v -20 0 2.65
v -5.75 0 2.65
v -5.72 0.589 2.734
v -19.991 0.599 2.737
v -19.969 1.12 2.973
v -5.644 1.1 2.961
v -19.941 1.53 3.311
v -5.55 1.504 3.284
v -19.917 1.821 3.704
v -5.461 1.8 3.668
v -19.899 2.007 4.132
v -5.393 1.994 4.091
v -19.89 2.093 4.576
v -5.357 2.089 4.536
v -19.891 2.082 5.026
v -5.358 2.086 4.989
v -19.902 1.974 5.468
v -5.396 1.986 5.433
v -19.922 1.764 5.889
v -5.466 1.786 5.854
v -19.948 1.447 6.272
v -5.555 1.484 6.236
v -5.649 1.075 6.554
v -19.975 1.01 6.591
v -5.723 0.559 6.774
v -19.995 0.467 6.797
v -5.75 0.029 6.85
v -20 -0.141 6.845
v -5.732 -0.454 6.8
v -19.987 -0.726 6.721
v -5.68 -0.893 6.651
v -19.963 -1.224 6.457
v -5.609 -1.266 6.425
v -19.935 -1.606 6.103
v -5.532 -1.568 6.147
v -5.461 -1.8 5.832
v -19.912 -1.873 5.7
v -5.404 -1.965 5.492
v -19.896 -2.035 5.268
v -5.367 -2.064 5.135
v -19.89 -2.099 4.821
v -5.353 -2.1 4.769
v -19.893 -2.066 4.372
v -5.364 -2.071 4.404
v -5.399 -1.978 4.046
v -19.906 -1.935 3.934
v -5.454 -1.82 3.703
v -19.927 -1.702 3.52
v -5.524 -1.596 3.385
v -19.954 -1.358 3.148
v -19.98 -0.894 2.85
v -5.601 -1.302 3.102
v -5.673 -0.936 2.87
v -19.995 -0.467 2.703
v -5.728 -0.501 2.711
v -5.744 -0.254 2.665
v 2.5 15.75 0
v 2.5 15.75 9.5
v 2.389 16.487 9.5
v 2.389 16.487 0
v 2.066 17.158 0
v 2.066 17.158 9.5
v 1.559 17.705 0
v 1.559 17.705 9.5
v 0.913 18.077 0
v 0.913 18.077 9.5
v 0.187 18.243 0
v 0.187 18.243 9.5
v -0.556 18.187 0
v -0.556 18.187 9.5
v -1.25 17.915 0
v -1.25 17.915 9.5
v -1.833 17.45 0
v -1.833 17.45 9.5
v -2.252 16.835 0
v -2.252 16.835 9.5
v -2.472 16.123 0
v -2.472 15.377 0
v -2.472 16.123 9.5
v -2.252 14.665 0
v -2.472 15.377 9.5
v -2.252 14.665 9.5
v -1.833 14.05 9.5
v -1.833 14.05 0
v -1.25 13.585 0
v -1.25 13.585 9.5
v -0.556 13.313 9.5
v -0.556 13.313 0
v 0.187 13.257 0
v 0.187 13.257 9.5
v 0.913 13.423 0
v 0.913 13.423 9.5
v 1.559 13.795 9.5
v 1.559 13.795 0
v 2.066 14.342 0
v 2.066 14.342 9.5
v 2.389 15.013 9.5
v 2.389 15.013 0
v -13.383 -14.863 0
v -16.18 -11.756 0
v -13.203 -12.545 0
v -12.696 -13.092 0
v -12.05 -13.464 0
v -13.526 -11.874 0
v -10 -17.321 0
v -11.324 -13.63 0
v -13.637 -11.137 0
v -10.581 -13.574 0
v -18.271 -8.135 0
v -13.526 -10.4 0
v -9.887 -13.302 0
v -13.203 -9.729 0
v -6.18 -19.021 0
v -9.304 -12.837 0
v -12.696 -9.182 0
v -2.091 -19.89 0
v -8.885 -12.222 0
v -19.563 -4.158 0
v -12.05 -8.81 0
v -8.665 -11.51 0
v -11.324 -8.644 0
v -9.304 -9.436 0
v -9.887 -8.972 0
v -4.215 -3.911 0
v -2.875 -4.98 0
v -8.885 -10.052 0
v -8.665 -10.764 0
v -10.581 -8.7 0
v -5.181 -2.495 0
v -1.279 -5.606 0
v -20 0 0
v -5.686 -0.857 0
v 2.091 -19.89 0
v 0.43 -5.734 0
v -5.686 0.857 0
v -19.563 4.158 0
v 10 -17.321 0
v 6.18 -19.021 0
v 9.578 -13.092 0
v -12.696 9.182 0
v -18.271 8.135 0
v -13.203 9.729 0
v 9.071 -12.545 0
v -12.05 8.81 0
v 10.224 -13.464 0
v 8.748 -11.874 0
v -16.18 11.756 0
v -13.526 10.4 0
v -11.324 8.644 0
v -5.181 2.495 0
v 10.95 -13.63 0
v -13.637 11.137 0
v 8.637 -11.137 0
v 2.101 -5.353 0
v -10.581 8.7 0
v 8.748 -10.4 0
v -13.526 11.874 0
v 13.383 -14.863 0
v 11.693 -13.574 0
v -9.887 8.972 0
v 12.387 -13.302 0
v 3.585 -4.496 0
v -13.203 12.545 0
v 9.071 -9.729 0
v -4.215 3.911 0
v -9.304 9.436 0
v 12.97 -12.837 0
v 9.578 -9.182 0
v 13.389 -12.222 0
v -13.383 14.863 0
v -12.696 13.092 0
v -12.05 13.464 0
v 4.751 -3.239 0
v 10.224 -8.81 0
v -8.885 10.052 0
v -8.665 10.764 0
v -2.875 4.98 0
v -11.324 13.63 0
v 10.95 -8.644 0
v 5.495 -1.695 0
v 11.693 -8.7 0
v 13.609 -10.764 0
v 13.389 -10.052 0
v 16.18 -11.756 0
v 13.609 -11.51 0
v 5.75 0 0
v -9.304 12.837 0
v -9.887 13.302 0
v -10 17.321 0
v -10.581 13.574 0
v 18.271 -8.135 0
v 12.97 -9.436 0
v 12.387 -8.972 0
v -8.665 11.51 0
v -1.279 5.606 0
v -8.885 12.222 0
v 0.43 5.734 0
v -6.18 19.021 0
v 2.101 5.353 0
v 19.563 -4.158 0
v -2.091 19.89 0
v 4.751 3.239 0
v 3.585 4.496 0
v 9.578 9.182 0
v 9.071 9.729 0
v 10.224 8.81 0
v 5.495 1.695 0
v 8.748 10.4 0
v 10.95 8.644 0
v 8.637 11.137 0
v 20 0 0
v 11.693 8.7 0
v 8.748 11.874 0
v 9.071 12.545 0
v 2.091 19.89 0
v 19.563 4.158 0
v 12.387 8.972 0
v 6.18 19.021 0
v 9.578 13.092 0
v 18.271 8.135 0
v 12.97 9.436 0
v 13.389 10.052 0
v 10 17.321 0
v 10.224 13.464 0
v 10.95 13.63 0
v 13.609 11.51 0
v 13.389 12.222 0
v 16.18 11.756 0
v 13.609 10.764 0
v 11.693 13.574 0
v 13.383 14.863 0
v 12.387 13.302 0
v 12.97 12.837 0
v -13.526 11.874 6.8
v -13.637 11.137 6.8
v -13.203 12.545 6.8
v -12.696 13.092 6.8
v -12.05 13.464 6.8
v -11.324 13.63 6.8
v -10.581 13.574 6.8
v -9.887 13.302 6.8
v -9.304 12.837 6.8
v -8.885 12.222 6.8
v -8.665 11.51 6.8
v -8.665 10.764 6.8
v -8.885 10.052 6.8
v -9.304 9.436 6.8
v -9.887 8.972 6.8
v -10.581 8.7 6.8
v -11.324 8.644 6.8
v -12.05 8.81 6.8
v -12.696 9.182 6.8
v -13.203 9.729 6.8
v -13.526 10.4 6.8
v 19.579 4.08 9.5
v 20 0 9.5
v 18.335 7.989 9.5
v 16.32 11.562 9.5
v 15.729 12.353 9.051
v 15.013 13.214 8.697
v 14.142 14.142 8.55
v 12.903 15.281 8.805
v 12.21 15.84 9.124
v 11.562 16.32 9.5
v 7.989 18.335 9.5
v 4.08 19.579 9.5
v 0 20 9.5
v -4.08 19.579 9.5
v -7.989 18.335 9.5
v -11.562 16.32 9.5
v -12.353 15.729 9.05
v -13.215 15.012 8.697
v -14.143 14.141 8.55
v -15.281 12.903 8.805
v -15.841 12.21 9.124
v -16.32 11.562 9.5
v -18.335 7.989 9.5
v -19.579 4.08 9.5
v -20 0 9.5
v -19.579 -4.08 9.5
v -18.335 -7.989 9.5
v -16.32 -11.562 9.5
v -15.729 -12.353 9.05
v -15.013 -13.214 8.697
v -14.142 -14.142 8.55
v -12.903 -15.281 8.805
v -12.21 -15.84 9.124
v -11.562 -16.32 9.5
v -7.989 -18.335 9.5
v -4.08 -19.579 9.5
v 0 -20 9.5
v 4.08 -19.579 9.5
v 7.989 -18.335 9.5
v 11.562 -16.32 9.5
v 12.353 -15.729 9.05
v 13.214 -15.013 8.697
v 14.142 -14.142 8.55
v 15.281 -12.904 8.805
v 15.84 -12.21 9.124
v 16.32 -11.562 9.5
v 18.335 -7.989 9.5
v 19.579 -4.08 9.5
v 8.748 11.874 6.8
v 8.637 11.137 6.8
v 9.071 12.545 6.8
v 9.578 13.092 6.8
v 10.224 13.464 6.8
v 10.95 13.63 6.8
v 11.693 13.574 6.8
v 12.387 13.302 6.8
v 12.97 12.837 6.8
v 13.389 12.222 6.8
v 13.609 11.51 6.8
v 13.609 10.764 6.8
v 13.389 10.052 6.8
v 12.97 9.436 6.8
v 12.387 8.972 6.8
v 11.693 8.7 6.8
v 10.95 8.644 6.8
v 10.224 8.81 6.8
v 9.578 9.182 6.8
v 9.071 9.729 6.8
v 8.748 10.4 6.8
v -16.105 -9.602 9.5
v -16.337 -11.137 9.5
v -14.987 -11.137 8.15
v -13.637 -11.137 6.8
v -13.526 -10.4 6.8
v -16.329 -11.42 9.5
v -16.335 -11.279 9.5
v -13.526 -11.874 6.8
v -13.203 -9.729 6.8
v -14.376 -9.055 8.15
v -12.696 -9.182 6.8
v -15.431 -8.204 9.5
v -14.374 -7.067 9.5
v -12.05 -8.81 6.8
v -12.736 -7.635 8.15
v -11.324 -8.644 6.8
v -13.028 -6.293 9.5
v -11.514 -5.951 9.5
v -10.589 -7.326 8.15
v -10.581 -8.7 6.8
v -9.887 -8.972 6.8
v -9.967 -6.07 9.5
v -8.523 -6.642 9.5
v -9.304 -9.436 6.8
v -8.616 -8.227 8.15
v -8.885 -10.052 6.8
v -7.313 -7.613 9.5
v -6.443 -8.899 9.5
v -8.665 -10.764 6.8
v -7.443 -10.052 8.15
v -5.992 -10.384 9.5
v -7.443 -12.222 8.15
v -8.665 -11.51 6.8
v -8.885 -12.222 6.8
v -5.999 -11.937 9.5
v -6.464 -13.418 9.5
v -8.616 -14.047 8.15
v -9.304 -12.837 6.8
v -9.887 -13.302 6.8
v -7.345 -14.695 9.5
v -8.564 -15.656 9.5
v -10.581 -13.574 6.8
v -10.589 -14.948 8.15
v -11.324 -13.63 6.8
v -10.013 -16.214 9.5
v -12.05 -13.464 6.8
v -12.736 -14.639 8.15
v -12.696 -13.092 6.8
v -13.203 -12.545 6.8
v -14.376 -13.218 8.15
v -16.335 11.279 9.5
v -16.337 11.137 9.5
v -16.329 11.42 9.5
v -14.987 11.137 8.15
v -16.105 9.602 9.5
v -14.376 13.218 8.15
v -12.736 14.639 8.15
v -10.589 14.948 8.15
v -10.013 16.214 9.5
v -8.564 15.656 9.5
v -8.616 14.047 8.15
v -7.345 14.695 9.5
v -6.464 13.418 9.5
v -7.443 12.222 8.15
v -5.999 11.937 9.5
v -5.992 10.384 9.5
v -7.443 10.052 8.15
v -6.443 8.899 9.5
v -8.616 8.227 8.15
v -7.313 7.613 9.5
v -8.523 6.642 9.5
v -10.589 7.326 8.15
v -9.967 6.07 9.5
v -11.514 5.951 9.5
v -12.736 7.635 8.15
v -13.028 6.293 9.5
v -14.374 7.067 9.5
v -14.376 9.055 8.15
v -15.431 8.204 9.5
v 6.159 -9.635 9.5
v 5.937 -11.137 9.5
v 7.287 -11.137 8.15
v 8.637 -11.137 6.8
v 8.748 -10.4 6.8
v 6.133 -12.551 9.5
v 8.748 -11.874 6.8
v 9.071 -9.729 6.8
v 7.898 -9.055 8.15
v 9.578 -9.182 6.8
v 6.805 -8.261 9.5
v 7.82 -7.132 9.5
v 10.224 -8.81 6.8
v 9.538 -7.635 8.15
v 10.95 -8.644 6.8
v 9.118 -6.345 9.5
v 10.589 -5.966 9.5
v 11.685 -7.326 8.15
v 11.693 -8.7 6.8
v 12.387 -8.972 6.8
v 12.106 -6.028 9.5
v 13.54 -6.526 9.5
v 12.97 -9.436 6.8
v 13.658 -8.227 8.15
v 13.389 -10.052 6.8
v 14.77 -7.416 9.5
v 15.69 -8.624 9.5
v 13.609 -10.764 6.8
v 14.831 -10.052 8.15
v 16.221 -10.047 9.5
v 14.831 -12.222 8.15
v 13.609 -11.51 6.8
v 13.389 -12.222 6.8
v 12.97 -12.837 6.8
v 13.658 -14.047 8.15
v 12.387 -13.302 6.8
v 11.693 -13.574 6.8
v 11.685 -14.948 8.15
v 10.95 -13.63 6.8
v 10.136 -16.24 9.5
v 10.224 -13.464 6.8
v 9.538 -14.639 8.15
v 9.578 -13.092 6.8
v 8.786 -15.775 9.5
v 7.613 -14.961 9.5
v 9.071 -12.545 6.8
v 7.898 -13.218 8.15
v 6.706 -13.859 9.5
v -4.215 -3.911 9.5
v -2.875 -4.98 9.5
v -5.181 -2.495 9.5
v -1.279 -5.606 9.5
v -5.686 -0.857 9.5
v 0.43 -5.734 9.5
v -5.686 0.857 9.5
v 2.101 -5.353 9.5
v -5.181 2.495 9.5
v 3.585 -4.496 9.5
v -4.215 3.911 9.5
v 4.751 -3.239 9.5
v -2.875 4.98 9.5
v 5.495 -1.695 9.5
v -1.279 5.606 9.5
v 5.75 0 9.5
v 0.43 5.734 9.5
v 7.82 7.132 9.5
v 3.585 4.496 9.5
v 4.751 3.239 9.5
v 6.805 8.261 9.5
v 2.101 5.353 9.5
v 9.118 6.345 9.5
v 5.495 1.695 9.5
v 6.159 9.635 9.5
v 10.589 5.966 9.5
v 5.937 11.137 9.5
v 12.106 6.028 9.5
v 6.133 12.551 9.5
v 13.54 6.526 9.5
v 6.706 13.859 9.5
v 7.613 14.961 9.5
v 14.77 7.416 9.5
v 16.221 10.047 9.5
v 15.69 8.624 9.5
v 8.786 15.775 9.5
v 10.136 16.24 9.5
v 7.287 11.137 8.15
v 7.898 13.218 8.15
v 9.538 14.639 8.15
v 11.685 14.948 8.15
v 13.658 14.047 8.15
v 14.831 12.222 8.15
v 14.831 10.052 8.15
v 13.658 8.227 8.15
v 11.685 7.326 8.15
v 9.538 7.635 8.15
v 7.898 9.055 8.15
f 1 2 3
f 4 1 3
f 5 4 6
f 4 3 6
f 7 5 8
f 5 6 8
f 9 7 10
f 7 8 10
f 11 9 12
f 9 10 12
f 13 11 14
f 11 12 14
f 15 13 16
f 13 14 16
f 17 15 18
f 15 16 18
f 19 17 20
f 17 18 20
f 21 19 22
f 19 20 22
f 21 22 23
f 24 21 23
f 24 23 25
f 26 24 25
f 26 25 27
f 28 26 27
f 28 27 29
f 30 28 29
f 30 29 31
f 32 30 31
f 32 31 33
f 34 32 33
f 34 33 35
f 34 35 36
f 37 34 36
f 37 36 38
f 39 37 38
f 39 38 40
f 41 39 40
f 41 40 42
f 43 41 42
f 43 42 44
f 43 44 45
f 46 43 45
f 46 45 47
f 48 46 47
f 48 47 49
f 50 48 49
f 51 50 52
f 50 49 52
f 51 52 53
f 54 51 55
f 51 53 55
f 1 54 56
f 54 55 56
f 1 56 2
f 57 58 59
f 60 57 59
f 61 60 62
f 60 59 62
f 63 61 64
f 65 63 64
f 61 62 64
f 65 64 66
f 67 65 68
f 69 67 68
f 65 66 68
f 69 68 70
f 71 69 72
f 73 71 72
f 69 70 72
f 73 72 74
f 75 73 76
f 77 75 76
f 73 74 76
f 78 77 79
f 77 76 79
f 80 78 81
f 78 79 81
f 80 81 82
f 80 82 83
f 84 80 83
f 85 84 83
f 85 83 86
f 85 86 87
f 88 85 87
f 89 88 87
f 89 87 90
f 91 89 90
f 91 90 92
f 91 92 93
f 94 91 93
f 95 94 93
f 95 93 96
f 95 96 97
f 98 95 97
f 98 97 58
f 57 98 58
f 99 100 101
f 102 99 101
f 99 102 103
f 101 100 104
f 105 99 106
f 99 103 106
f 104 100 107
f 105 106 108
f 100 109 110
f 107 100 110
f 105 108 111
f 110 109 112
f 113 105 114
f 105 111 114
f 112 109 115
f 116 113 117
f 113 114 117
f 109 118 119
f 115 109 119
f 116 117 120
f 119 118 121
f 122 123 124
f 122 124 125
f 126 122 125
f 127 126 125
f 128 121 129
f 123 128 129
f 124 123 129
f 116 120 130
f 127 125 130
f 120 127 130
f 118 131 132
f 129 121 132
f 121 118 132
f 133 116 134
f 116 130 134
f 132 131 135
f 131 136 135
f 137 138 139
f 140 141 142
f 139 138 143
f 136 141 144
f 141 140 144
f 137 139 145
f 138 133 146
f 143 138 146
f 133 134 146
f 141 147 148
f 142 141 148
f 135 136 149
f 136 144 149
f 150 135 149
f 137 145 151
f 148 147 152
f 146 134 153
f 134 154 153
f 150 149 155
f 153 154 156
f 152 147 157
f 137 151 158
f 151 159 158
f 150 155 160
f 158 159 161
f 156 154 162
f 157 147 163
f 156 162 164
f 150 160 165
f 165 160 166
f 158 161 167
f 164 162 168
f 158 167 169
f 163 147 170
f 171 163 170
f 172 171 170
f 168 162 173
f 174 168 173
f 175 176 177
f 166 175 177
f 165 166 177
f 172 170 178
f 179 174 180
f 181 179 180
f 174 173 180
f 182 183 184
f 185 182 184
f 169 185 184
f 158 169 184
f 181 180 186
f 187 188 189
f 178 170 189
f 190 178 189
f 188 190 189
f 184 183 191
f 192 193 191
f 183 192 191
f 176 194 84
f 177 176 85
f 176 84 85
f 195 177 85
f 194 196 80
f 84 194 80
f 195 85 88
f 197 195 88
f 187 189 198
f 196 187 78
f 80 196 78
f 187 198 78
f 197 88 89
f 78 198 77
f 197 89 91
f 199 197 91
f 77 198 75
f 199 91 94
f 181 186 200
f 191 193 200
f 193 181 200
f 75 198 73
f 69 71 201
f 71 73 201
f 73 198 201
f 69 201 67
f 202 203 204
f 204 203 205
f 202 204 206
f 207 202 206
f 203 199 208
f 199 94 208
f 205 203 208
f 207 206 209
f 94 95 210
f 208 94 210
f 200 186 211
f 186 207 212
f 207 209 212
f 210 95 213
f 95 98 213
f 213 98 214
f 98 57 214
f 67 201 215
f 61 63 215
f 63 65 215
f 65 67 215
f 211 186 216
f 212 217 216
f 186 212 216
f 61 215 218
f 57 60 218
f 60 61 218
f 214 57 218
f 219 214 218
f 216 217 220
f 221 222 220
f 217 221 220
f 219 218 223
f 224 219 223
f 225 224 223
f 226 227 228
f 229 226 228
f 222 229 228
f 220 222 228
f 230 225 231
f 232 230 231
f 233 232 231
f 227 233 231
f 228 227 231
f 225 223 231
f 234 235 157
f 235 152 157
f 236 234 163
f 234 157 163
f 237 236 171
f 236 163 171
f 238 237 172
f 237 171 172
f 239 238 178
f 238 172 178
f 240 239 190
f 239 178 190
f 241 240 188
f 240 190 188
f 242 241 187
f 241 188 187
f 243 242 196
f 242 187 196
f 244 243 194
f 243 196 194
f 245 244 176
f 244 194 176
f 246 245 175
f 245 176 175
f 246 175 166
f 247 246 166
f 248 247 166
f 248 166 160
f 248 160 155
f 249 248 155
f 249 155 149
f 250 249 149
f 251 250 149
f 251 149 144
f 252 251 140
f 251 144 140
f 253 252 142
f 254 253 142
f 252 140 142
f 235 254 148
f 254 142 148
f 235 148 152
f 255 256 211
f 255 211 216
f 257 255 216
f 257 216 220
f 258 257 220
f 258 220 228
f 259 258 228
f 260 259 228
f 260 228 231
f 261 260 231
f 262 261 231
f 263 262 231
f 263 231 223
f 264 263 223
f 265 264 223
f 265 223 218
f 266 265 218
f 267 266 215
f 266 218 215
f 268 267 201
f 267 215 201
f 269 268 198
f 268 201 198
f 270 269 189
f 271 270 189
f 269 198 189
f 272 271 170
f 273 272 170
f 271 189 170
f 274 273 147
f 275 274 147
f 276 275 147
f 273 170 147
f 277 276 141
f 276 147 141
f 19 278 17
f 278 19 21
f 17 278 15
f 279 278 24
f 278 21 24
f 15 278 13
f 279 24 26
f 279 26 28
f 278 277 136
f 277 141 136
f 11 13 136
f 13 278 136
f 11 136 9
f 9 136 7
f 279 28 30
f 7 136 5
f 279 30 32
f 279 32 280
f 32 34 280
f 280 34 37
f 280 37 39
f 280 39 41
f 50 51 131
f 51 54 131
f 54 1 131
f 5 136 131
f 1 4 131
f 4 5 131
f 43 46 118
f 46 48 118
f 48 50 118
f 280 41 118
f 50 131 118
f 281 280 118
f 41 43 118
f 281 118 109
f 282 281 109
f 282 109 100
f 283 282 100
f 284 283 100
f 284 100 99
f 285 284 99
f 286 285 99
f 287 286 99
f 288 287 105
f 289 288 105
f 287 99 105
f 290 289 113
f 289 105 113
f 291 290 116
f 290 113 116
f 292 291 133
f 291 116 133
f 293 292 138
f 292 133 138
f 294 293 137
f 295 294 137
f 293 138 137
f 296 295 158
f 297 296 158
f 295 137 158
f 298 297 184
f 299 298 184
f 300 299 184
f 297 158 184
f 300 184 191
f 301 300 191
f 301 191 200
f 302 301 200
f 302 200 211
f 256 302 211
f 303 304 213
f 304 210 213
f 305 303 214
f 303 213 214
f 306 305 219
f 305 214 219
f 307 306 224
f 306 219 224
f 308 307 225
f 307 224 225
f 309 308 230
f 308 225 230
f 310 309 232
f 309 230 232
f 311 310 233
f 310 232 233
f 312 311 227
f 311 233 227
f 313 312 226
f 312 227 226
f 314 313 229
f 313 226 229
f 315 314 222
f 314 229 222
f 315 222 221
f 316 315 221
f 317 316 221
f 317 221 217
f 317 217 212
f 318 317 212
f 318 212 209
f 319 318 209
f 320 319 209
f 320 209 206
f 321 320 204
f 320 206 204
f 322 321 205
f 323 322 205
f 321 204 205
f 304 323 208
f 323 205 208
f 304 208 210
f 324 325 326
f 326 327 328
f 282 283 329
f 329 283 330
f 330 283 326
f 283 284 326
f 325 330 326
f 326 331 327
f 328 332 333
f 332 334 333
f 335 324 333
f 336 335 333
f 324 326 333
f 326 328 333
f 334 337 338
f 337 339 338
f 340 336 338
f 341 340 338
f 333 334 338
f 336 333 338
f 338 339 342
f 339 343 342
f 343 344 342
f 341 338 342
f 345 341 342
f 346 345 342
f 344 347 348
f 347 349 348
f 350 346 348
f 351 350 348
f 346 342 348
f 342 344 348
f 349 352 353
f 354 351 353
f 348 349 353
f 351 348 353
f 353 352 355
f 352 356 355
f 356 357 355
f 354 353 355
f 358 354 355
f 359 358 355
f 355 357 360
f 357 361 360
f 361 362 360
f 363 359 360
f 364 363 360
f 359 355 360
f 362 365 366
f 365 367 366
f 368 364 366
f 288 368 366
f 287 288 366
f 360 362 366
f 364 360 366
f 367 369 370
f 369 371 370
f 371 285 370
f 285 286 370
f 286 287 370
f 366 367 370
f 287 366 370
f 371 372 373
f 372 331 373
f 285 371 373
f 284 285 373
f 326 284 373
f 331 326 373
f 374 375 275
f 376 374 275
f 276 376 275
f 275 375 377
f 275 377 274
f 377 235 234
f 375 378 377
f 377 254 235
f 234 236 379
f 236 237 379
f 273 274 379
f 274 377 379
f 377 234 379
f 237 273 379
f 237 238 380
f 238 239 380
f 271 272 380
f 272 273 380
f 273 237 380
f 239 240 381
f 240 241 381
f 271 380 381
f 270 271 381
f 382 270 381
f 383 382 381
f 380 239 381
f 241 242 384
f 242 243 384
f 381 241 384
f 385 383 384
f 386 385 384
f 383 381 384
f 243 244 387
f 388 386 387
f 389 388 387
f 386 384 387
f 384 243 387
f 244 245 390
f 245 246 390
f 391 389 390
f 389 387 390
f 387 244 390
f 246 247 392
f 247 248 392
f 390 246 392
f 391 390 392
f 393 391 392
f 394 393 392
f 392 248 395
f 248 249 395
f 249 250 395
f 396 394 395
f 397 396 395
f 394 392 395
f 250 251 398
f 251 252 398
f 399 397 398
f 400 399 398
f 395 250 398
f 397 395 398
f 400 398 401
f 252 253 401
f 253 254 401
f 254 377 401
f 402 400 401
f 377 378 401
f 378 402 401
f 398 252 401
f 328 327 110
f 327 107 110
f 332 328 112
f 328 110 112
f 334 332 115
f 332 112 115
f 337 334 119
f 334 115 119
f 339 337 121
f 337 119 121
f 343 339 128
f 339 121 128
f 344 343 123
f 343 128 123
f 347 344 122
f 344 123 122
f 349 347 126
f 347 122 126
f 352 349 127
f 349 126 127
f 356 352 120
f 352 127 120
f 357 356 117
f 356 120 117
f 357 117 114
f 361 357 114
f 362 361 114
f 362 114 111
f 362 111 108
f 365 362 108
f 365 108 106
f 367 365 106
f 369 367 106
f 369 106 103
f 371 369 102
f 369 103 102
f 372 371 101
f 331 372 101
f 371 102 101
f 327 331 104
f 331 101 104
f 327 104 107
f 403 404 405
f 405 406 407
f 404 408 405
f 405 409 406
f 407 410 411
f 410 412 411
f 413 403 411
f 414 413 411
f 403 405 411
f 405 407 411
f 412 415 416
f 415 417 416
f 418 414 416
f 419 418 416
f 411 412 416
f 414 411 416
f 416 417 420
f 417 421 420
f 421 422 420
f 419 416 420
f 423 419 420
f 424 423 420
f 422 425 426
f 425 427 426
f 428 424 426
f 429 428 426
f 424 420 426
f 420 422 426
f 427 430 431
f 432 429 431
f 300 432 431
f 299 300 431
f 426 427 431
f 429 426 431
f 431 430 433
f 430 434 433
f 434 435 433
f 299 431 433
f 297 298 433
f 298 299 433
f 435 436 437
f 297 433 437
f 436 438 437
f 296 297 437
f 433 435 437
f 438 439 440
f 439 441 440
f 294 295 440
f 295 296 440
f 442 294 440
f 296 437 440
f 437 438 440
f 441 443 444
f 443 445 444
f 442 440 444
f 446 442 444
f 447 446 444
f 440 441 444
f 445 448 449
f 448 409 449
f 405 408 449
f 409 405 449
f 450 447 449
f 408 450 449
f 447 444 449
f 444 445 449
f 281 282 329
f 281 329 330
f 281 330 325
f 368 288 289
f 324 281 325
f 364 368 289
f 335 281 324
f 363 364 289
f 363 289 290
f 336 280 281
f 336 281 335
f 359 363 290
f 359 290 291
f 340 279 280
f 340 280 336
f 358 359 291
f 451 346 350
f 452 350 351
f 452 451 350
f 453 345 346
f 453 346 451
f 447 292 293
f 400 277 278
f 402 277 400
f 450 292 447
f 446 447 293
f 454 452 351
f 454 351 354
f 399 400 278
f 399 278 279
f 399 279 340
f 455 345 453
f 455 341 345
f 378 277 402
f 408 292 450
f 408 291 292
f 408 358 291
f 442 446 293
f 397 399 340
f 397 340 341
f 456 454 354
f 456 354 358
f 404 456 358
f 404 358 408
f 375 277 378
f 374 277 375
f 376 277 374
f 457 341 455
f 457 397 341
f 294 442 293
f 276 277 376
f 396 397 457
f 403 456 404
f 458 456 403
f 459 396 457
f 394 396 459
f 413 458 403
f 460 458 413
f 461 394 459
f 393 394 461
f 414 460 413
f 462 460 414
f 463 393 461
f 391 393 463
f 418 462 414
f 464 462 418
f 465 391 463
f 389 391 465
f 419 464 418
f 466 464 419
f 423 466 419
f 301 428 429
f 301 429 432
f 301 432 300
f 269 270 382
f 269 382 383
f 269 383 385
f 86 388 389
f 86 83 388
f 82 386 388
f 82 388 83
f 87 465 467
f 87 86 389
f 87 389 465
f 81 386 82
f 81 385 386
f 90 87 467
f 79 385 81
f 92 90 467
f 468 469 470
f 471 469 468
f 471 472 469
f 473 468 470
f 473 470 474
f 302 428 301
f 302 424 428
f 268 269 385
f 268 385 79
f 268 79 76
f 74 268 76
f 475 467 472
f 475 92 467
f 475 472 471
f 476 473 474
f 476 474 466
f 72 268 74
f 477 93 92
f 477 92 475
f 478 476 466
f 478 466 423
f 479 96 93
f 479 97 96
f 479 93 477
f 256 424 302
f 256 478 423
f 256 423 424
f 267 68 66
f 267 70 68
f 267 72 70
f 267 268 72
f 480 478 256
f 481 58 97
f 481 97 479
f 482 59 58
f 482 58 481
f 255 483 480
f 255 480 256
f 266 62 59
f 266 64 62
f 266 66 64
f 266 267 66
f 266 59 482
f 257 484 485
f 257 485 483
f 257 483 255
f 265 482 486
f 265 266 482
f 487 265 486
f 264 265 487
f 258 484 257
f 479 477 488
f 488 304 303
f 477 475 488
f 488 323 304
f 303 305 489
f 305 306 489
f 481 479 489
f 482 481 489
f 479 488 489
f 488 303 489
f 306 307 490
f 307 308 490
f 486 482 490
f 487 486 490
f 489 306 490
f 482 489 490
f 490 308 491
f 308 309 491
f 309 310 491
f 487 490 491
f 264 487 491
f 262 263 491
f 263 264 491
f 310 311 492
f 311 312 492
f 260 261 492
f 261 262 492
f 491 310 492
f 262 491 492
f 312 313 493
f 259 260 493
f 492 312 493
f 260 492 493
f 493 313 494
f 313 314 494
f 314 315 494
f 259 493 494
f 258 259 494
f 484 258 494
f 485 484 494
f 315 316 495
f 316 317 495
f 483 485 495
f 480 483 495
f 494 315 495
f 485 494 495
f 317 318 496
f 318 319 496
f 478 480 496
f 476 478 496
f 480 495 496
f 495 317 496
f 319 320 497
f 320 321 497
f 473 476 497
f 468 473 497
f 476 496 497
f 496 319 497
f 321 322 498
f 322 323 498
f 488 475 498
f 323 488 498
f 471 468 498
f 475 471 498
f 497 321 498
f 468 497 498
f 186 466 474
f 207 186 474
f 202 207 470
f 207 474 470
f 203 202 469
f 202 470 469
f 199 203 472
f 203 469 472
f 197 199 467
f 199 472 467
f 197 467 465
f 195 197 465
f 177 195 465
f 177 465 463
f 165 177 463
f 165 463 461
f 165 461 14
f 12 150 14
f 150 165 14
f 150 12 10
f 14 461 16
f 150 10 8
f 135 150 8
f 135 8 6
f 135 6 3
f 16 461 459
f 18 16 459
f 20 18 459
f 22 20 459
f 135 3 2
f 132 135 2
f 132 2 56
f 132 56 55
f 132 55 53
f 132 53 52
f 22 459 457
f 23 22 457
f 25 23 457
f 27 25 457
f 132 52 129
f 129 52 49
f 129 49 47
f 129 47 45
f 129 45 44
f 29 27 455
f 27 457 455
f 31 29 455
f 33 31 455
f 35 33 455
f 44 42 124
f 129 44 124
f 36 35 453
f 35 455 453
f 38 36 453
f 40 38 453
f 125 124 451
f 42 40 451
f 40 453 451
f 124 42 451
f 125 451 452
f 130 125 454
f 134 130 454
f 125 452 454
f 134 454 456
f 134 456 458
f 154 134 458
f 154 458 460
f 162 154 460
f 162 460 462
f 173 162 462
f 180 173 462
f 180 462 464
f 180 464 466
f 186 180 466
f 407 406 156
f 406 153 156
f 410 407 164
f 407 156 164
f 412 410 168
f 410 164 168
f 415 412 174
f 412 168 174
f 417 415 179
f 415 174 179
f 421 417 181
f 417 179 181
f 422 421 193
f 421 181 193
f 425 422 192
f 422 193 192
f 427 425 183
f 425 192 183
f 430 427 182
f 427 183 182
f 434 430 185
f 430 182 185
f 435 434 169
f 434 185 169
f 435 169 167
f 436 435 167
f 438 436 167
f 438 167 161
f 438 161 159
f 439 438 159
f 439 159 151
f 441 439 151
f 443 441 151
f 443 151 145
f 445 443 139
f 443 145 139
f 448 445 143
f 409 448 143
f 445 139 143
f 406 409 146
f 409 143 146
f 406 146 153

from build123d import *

# Parameters (mm, degrees)
SKETCH2_R                                       = 20
BOSS_EXTRUDE1_DEPTH                             = 9.5
CSK_FOR_M5_FLAT_HEAD_MACHINE_SCREW1_D           = 5
CSK_FOR_M5_FLAT_HEAD_MACHINE_SCREW1_CSINK_D     = 10.4
CSK_FOR_M5_FLAT_HEAD_MACHINE_SCREW1_CSINK_ANGLE = 90
SKETCH5_R                                       = 2.5
CUT_EXTRUDE1_DEPTH                              = 30.837057662
SKETCH6_R                                       = 5.75
CUT_EXTRUDE2_DEPTH                              = 30.837057662
SKETCH8_R                                       = 2.1
CUT_EXTRUDE3_DEPTH                              = 30.837057662


with BuildPart() as part:
    # Sketch2 → Boss-Extrude1 (new body)
    with BuildSketch(Plane.XY):
        Circle(SKETCH2_R)
    extrude(amount=BOSS_EXTRUDE1_DEPTH)

    # CSK for M5 Flat Head Machine Screw1 (through all)
    with Locations(Plane.XY.offset(9.5)):
        with Locations((-11.136931804, 11.136931804), (11.136931804, 11.136931804), (11.136931804, -11.136931804), (-11.136931804, -11.136931804)):
            CounterSinkHole(CSK_FOR_M5_FLAT_HEAD_MACHINE_SCREW1_D / 2, CSK_FOR_M5_FLAT_HEAD_MACHINE_SCREW1_CSINK_D / 2, counter_sink_angle=CSK_FOR_M5_FLAT_HEAD_MACHINE_SCREW1_CSINK_ANGLE)

    # Sketch5 → Cut-Extrude1 (cut, through all)
    with BuildSketch(Plane.XY.offset(9.5)):
        with Locations((0, 15.75)):
            Circle(SKETCH5_R)
    extrude(amount=-CUT_EXTRUDE1_DEPTH, mode=Mode.SUBTRACT)

    # Sketch6 → Cut-Extrude2 (cut, through all)
    with BuildSketch(Plane.XY.offset(9.5)):
        Circle(SKETCH6_R)
    extrude(amount=-CUT_EXTRUDE2_DEPTH, mode=Mode.SUBTRACT)

    # Sketch8 → Cut-Extrude3 (cut, through all)
    with BuildSketch(Plane(origin=(0, 0, 0), x_dir=(0, 0, -1), z_dir=(1, 0, 0))):
        with Locations((-4.75, 0)):
            Circle(SKETCH8_R)
    extrude(amount=-CUT_EXTRUDE3_DEPTH, mode=Mode.SUBTRACT)


solid = part.part
